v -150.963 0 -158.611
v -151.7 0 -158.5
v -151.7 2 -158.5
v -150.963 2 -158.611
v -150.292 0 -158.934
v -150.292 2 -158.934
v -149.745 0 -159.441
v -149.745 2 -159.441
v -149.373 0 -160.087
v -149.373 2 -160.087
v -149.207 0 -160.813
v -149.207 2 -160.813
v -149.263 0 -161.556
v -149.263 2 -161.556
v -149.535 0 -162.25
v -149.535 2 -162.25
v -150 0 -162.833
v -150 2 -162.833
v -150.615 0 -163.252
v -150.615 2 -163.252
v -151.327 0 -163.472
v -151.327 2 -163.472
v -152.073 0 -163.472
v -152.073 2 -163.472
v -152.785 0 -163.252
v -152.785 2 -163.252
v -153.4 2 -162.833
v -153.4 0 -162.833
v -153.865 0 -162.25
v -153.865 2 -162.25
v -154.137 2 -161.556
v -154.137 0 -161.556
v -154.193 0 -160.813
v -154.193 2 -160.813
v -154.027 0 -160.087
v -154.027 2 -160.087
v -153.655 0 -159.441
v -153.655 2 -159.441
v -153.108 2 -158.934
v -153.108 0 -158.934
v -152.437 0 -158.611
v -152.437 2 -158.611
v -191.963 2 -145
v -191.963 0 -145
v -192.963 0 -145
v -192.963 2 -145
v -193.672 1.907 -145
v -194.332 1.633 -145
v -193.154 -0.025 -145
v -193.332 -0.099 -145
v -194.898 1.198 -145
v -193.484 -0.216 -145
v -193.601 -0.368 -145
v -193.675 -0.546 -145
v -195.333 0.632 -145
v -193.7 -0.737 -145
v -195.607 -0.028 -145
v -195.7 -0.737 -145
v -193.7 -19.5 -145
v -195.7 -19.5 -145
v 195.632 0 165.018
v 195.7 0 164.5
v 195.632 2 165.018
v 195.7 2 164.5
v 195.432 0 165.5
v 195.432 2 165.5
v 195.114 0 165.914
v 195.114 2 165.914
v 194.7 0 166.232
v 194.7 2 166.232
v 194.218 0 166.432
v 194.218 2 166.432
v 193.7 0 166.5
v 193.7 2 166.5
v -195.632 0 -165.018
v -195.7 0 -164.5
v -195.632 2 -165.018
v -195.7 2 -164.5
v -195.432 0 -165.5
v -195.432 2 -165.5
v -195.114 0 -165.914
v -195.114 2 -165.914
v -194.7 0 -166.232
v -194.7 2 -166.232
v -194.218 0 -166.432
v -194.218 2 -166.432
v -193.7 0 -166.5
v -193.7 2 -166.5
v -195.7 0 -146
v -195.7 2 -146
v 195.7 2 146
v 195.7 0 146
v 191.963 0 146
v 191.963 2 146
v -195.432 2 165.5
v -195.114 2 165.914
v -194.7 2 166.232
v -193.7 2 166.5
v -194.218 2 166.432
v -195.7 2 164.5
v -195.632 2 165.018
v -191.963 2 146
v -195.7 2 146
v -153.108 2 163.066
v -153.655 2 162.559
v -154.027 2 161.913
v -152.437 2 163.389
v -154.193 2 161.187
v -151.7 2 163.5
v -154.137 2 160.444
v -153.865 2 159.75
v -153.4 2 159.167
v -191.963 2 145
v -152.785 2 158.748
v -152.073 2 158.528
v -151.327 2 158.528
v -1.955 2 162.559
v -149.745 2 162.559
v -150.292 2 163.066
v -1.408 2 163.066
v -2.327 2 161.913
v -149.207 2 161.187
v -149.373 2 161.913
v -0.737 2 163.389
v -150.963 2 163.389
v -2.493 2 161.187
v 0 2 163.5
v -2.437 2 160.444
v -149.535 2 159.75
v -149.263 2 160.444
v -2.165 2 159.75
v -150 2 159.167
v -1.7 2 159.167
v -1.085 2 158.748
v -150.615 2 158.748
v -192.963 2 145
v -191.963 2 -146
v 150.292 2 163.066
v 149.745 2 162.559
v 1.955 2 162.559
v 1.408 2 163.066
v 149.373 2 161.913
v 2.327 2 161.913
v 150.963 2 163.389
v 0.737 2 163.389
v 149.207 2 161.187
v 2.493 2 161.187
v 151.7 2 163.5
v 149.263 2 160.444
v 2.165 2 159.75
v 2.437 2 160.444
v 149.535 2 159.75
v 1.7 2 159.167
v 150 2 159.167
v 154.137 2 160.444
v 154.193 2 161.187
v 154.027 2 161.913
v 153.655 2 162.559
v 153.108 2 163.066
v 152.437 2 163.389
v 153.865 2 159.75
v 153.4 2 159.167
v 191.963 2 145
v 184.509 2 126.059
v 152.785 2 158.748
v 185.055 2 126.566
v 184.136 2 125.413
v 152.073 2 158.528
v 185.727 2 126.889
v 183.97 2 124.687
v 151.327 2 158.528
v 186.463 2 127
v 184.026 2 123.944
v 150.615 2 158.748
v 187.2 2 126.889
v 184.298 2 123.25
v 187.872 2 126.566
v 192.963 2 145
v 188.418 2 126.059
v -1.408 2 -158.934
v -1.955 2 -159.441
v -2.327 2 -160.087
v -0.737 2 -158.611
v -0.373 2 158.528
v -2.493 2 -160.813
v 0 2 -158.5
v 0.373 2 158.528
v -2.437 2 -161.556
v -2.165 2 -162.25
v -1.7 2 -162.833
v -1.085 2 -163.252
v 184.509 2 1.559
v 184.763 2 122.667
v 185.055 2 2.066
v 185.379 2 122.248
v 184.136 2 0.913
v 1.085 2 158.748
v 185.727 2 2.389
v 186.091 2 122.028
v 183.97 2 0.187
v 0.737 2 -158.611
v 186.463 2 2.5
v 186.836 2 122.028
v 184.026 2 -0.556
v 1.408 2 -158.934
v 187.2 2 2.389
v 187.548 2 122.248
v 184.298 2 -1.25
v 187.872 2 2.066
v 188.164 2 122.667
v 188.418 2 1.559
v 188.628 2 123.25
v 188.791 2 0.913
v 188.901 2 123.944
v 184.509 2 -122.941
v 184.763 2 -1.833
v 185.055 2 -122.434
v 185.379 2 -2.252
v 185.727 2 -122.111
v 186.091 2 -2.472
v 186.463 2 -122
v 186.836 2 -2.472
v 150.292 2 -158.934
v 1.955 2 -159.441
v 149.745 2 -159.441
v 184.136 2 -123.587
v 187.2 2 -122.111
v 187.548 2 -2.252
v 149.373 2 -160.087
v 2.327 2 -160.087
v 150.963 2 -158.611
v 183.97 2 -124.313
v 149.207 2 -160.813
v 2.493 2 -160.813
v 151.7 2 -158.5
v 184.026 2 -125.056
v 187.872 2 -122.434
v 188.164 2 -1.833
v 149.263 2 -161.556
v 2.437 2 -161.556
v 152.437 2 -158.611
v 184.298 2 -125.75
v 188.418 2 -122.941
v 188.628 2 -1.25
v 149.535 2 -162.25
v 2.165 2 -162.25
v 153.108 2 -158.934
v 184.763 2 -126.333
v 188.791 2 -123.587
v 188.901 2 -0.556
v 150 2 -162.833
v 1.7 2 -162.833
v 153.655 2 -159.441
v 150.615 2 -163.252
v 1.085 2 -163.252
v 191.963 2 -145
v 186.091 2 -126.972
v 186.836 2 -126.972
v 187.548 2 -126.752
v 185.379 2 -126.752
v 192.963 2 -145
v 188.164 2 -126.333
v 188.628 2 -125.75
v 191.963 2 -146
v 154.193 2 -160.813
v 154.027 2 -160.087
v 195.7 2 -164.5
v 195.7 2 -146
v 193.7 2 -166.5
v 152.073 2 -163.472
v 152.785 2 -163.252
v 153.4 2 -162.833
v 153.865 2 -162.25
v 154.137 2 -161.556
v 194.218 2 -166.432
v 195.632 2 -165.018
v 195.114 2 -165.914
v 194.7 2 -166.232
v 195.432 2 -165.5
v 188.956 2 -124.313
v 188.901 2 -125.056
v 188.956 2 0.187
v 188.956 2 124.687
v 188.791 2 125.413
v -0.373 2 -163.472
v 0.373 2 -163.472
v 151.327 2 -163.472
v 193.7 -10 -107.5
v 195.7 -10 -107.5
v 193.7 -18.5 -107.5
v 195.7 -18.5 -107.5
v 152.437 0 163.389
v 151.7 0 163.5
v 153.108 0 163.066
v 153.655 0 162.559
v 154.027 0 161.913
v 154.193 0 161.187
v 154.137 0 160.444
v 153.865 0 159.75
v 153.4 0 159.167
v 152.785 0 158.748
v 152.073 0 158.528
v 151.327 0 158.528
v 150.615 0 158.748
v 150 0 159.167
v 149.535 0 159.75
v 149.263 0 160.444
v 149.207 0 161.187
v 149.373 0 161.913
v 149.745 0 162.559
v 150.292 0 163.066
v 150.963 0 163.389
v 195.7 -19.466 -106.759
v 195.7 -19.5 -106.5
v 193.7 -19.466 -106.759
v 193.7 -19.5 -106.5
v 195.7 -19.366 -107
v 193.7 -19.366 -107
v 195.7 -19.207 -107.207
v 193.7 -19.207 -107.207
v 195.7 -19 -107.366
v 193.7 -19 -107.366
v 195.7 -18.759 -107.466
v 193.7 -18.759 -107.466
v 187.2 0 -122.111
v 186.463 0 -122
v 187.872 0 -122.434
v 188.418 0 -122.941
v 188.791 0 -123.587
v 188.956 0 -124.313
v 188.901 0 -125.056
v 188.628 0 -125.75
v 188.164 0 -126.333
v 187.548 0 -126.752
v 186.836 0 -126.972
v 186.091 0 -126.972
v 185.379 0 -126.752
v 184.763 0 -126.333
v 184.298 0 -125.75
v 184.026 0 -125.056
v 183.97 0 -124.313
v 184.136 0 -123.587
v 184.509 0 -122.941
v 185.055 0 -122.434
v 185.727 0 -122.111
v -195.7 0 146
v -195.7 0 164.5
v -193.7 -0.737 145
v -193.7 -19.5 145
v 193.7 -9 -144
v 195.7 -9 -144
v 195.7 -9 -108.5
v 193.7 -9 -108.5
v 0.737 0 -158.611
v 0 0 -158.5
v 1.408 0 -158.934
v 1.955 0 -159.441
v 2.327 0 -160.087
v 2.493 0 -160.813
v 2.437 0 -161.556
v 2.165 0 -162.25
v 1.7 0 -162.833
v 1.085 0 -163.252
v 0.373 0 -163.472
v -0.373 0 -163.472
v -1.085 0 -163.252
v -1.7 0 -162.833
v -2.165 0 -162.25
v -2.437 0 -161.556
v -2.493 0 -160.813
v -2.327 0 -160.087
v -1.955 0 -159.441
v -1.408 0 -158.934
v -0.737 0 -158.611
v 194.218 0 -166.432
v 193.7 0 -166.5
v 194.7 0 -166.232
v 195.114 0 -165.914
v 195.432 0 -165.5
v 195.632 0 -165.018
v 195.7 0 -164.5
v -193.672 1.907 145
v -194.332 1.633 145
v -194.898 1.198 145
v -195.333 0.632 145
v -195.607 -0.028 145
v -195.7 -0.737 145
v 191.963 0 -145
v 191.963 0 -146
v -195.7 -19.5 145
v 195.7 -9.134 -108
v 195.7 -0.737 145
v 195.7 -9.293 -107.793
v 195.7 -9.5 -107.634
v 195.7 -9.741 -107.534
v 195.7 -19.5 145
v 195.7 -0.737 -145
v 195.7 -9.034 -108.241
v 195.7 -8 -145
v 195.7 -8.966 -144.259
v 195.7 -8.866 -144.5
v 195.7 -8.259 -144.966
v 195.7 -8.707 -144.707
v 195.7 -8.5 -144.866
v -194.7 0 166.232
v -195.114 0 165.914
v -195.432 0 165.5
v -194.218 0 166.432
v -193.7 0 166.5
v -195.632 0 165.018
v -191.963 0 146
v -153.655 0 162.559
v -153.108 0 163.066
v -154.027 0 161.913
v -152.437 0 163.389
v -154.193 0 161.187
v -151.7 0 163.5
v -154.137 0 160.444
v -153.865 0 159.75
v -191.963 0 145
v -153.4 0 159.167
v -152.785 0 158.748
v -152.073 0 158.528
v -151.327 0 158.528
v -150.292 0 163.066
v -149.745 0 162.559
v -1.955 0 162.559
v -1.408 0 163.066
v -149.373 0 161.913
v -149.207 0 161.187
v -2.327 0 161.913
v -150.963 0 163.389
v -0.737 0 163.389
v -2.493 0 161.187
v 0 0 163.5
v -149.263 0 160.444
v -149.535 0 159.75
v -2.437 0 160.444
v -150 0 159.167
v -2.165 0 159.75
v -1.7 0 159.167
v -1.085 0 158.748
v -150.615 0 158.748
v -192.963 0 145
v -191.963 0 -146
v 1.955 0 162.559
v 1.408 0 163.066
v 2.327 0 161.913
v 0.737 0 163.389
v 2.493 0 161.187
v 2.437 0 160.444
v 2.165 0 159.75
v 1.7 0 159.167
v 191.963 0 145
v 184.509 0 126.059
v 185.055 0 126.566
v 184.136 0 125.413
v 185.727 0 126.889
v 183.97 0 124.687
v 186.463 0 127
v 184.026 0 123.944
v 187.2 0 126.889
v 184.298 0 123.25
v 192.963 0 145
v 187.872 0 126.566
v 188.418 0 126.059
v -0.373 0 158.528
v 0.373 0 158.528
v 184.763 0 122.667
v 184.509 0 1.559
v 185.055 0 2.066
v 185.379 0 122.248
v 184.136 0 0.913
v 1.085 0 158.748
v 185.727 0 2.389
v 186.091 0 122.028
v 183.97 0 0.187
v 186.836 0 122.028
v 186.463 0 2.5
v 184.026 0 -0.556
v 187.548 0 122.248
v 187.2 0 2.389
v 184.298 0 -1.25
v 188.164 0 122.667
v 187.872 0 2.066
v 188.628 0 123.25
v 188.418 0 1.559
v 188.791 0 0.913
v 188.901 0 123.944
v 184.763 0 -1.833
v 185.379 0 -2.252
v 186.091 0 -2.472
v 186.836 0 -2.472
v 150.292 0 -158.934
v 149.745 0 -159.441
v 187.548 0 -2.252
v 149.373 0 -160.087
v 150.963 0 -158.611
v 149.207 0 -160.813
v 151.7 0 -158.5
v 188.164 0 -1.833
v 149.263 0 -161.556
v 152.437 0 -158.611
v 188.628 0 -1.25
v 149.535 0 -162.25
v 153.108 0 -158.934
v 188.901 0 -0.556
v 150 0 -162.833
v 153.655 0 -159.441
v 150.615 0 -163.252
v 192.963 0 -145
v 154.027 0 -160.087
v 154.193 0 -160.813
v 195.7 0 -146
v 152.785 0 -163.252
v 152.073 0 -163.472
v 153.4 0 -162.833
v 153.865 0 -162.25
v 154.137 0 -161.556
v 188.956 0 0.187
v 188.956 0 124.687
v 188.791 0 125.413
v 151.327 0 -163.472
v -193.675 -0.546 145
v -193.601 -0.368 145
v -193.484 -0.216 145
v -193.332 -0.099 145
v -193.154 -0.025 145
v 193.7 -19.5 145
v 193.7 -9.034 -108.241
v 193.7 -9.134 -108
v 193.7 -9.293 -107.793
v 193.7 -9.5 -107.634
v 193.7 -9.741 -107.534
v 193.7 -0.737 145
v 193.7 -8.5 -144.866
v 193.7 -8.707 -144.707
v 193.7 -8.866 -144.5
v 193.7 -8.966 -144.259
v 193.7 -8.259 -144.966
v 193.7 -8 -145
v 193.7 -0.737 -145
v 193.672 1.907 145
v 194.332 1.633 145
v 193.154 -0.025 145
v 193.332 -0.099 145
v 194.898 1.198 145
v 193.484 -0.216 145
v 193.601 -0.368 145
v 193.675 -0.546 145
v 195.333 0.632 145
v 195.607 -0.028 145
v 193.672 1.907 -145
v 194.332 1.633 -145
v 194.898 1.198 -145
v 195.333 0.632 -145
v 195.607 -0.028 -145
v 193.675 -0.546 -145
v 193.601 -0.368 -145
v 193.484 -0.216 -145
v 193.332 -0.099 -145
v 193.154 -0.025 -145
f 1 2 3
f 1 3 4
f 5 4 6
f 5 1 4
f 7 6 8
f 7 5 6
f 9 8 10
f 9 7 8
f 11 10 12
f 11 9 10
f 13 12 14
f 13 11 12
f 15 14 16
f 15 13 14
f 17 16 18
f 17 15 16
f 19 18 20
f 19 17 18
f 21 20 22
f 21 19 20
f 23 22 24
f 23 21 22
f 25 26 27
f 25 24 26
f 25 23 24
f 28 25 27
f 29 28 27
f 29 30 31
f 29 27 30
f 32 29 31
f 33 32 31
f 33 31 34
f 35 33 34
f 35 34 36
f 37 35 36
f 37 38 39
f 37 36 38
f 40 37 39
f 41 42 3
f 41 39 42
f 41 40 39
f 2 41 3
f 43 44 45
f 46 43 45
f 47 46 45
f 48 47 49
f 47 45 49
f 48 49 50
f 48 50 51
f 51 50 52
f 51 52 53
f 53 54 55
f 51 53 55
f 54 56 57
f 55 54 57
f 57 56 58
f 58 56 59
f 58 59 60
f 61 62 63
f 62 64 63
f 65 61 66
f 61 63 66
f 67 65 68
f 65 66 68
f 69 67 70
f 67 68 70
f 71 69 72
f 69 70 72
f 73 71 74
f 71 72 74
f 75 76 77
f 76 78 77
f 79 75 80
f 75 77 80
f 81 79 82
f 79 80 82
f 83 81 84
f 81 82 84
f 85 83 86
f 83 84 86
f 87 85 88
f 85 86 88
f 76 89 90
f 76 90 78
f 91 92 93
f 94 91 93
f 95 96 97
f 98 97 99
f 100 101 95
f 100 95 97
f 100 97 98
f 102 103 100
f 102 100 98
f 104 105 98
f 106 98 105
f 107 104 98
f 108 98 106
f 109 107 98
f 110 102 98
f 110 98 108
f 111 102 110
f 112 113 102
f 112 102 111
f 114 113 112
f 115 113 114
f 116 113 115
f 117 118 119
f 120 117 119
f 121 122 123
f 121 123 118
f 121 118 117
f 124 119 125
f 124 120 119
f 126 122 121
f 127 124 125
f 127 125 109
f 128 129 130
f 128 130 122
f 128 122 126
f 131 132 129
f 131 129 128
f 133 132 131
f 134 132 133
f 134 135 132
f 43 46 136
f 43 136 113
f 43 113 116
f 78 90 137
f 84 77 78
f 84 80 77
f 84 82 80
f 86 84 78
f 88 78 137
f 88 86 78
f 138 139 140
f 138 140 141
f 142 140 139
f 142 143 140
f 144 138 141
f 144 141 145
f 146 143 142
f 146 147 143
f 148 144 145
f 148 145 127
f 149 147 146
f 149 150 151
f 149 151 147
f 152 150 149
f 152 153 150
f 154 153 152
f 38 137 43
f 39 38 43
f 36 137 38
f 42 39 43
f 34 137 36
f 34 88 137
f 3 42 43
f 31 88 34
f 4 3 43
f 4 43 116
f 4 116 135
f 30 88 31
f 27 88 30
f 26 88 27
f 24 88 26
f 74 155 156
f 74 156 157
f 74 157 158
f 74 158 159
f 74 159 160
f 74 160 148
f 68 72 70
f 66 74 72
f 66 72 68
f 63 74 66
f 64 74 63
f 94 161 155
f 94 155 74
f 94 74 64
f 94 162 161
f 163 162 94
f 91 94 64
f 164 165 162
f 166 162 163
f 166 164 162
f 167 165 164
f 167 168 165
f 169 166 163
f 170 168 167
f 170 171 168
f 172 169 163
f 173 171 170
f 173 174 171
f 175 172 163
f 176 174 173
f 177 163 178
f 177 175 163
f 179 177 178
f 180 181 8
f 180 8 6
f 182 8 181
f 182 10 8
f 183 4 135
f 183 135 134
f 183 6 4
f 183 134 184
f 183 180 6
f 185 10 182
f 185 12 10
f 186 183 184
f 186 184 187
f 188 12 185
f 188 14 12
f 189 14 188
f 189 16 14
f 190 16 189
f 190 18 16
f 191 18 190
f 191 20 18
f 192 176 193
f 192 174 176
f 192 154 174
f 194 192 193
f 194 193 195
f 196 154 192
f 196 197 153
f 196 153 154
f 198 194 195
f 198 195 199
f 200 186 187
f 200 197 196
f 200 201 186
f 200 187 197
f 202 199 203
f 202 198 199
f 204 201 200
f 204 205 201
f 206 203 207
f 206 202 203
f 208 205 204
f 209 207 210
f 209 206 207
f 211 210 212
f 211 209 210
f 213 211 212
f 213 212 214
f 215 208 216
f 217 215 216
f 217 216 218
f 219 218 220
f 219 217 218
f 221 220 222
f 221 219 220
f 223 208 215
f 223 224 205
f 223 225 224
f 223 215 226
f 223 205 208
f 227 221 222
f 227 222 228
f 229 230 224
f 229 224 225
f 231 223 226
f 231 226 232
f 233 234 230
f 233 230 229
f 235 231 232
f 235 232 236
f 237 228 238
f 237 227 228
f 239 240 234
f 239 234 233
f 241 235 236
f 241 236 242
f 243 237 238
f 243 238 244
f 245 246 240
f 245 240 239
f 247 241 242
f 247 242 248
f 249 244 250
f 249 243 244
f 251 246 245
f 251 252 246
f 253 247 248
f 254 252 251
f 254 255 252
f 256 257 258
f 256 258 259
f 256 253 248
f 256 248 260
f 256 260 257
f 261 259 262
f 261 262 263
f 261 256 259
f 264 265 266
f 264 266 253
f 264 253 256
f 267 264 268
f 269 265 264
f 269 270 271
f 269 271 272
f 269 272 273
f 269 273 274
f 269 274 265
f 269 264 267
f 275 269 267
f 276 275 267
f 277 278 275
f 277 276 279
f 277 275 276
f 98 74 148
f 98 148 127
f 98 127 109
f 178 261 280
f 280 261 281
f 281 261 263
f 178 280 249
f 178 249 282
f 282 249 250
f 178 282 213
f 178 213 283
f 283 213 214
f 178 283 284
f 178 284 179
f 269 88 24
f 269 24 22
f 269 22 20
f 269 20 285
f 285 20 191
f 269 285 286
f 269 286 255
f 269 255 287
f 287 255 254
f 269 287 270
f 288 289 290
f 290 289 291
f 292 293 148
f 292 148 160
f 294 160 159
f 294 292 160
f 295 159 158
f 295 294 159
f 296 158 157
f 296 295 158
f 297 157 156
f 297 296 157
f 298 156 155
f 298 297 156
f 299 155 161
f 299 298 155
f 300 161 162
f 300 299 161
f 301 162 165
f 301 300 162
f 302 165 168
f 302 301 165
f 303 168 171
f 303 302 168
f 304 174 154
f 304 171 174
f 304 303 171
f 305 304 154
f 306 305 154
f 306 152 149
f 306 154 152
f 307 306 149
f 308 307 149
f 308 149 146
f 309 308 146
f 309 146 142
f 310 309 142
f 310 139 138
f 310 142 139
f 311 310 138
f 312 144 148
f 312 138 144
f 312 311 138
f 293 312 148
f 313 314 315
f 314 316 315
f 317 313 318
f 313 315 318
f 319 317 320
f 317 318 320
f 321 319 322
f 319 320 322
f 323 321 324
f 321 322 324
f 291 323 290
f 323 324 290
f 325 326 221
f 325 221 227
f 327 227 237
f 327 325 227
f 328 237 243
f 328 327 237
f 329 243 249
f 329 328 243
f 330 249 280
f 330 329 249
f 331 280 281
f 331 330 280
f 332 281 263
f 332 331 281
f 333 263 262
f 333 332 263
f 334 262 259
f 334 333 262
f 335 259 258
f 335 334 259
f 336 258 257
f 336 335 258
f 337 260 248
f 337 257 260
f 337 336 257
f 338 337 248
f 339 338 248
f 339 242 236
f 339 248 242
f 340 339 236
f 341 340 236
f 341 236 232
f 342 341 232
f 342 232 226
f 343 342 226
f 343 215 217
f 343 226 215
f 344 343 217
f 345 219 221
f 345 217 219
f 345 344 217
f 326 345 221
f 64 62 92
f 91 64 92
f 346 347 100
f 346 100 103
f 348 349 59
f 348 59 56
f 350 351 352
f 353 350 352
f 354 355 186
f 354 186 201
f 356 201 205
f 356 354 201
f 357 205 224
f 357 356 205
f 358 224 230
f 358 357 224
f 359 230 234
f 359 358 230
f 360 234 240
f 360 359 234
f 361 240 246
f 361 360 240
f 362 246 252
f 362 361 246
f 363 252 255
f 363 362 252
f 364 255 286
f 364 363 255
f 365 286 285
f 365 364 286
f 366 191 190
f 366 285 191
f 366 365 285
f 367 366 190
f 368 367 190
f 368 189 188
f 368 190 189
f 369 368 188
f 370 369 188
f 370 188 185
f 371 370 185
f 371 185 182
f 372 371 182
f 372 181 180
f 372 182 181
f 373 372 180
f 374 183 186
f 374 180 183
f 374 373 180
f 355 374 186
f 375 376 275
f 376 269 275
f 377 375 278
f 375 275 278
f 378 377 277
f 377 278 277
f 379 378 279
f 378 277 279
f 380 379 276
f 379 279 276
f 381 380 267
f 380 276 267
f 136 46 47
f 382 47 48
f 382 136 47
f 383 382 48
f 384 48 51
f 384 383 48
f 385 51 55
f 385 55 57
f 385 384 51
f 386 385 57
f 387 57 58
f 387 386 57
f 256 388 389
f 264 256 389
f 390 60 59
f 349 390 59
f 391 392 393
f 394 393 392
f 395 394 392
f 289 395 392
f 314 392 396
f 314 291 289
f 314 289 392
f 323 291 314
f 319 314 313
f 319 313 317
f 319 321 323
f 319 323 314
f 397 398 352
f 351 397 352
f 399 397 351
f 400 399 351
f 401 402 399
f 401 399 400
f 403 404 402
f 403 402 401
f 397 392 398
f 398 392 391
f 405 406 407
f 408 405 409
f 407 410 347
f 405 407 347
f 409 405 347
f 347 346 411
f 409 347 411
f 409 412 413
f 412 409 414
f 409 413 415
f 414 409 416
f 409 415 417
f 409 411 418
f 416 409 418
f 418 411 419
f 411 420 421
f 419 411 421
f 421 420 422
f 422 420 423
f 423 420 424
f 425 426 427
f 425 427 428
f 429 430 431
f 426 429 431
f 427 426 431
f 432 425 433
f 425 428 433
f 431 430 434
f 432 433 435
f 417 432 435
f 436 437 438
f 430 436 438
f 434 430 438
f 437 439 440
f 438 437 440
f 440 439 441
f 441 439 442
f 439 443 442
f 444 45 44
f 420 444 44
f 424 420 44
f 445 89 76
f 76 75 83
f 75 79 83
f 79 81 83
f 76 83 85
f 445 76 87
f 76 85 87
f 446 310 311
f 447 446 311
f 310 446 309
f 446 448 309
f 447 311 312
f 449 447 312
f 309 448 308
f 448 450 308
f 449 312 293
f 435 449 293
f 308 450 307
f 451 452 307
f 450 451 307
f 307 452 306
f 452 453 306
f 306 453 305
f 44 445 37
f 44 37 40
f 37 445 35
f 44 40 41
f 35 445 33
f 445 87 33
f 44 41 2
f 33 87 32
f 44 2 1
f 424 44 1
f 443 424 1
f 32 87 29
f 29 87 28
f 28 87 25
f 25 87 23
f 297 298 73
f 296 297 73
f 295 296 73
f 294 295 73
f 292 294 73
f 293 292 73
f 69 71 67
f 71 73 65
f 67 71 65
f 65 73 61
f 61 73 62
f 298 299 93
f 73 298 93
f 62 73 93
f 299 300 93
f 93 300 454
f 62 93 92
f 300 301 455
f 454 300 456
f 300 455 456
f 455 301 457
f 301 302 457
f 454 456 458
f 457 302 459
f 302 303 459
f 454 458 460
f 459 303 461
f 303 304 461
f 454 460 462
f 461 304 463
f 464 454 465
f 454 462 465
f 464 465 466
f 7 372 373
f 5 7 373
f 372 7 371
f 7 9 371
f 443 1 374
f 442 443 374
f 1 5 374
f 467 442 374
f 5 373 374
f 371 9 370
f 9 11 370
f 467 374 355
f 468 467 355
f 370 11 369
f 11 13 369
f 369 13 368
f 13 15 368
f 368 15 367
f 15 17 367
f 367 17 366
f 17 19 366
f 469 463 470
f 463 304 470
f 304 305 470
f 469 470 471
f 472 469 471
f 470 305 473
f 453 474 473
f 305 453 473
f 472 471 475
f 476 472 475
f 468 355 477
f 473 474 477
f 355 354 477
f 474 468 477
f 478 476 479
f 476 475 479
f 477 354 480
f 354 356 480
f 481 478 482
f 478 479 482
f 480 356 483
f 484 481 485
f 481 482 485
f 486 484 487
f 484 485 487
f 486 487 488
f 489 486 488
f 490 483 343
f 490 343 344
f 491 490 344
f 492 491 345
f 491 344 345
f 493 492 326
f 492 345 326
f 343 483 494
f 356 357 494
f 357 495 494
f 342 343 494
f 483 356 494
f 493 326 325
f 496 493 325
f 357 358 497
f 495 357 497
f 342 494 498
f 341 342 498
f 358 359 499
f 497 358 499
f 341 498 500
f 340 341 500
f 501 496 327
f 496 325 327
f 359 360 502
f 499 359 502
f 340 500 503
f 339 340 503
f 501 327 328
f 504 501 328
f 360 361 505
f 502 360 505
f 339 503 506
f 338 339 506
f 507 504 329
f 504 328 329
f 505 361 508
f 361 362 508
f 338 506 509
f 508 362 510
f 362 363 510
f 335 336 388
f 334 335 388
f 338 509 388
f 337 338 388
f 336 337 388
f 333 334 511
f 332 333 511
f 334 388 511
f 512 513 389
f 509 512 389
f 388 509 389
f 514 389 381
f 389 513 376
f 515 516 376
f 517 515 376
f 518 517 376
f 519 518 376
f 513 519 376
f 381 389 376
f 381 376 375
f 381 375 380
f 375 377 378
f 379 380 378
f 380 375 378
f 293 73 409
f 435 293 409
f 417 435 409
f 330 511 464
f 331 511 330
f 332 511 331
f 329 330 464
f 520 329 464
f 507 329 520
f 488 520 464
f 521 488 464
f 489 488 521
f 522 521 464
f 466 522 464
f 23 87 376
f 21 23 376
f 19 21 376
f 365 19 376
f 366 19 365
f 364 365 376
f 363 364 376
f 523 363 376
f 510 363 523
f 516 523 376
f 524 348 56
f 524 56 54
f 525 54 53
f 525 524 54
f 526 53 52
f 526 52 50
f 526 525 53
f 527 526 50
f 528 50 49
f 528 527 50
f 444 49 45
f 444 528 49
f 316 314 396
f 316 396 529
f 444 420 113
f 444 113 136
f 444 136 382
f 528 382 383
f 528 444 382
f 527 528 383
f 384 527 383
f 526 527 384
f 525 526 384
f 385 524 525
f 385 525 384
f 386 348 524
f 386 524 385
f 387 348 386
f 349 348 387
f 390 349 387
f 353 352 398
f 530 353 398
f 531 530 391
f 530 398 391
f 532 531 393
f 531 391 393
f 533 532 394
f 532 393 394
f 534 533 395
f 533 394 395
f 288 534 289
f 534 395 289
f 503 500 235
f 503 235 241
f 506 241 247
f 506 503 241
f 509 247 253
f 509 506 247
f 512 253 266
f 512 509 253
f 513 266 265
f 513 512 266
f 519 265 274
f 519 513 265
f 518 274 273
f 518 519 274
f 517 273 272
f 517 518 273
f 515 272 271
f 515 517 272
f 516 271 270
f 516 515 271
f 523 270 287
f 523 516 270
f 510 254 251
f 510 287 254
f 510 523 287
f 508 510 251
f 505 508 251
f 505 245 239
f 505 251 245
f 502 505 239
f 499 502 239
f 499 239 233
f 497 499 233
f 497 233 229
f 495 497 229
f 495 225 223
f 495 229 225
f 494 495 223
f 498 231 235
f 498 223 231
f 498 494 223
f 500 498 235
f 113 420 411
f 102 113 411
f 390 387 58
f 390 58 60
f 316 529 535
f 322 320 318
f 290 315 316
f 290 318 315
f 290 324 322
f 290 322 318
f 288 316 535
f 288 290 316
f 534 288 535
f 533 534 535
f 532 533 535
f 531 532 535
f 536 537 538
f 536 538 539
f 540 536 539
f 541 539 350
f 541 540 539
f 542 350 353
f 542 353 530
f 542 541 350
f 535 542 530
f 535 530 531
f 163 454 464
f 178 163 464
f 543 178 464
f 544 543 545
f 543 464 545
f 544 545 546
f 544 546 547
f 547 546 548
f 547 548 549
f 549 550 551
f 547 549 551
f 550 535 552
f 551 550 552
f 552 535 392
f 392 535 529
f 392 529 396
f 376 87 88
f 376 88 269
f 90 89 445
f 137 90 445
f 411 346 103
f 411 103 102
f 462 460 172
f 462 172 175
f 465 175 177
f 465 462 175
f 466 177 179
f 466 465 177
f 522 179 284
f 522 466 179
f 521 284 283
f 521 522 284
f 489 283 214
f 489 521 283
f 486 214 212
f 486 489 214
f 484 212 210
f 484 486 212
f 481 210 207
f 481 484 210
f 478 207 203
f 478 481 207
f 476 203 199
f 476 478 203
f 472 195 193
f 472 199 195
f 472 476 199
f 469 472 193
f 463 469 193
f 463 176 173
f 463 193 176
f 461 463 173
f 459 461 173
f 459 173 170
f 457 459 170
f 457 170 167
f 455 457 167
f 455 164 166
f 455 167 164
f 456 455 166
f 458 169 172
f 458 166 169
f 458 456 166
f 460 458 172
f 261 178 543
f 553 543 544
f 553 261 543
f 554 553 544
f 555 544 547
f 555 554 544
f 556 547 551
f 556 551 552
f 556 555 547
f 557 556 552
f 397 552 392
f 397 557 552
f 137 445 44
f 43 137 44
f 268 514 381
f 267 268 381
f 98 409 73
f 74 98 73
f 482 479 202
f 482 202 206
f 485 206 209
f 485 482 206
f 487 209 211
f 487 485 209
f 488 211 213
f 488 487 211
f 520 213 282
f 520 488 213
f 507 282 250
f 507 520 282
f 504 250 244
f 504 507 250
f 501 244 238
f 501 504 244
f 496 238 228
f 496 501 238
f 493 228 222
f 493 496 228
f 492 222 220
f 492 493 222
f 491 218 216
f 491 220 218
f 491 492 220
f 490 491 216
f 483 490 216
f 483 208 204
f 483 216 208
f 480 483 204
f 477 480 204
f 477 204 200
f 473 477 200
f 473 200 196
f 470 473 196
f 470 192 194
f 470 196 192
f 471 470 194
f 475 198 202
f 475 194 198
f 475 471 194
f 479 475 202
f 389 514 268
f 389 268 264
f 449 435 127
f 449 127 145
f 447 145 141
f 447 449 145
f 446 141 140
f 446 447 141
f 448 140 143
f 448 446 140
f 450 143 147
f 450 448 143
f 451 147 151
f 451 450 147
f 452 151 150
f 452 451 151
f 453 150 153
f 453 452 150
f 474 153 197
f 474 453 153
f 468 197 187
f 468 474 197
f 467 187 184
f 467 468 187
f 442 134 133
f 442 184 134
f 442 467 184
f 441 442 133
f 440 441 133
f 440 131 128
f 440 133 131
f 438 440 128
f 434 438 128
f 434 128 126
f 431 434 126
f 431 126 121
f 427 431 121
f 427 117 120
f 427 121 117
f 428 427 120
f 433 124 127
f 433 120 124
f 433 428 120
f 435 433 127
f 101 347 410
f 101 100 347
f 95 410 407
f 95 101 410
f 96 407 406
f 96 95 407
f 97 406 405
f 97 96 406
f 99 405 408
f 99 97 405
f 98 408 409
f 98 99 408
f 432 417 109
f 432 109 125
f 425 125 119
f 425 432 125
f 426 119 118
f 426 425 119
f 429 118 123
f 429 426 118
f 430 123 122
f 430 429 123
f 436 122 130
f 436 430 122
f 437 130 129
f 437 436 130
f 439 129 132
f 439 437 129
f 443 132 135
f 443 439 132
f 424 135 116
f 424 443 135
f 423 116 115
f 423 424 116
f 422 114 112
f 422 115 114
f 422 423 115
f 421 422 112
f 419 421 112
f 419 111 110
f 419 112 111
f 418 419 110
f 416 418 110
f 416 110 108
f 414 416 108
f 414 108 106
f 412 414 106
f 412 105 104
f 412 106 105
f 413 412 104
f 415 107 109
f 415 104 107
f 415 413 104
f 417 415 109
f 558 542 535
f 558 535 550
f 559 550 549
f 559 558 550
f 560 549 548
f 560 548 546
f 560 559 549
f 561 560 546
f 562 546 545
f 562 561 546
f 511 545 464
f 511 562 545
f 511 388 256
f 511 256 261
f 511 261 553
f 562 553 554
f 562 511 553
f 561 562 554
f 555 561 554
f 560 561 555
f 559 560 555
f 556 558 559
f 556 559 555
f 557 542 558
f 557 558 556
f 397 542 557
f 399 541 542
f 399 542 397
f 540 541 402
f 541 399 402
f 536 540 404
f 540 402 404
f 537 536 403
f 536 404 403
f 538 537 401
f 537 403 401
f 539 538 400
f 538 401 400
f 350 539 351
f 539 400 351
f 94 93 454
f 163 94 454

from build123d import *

# Parameters (mm, degrees)
SKETCH1_W                       = 391.4
SKETCH1_H                       = 333
BASE_FLANGE1_DEPTH              = 2
EDGE_FLANGE1_STRIP_W            = 9.4732
EDGE_FLANGE1_STRIP_H            = 2
EDGE_FLANGE1_STRIP_CUT_DEPTH    = 290
EDGE_FLANGE1_RELIEF_W           = 10.4732
EDGE_FLANGE1_RELIEF_H           = 1
EDGE_FLANGE1_RELIEF_CUT_DEPTH   = 2
EDGE_FLANGE1_STRIP_2_W          = 9.4732
EDGE_FLANGE1_STRIP_2_H          = 2
EDGE_FLANGE1_STRIP_CUT_2_DEPTH  = 290
EDGE_FLANGE1_RELIEF_2_W         = 10.4732
EDGE_FLANGE1_RELIEF_2_H         = 1
EDGE_FLANGE1_RELIEF_CUT_2_DEPTH = 2
EDGE_FLANGE1_DEPTH              = 290
EDGE_FLANGE1_BEND_DEPTH         = 290
FILLET1_R                       = 2
CUT_EXTRUDE1_DEPTH              = 10
FILLET2_R                       = 1
CUT_EXTRUDE2_DEPTH              = 258.84295608
CUT_EXTRUDE2_DEPTH_BACK         = 258.84295608
SKETCH9_R                       = 2.5


# Sheet-metal steps are written as plain solids
with BuildPart() as part:
    # Sketch1 → Base-Flange1 (new body)
    with BuildSketch(Plane(origin=(0, 0, 0), x_dir=(1, 0, 0), z_dir=(0, 1, 0))):
        Rectangle(SKETCH1_W, SKETCH1_H)
    extrude(amount=BASE_FLANGE1_DEPTH)

    # Edge-Flange1 strip (across the edge) → Edge-Flange1 strip cut (cut)
    with BuildSketch(Plane(origin=(-195.7, 0, 145), x_dir=(1, 0, 0), z_dir=(0, 0, -1))):
        with Locations((-2, -1)):
            Rectangle(EDGE_FLANGE1_STRIP_W, EDGE_FLANGE1_STRIP_H)
    extrude(amount=EDGE_FLANGE1_STRIP_CUT_DEPTH, mode=Mode.SUBTRACT)

    # Edge-Flange1 relief (on the sheet) → Edge-Flange1 relief cut (cut)
    with BuildSketch(Plane(origin=(-192.9634, 0, 145), x_dir=(1, 0, 0), z_dir=(0, -1, 0))):
        with Locations((-4.2366, 0.5)):
            Rectangle(EDGE_FLANGE1_RELIEF_W, EDGE_FLANGE1_RELIEF_H)
        with Locations((-4.2366, -290.5)):
            Rectangle(EDGE_FLANGE1_RELIEF_W, EDGE_FLANGE1_RELIEF_H)
    extrude(amount=-EDGE_FLANGE1_RELIEF_CUT_DEPTH, mode=Mode.SUBTRACT)

    # Edge-Flange1 strip 2 (across the edge) → Edge-Flange1 strip cut 2 (cut)
    with BuildSketch(Plane(origin=(195.7, 0, -145), x_dir=(-1, 0, 0), z_dir=(0, 0, 1))):
        with Locations((-2, -1)):
            Rectangle(EDGE_FLANGE1_STRIP_2_W, EDGE_FLANGE1_STRIP_2_H)
    extrude(amount=EDGE_FLANGE1_STRIP_CUT_2_DEPTH, mode=Mode.SUBTRACT)

    # Edge-Flange1 relief 2 (on the sheet) → Edge-Flange1 relief cut 2 (cut)
    with BuildSketch(Plane(origin=(192.9634, 0, -145), x_dir=(-1, 0, 0), z_dir=(0, -1, 0))):
        with Locations((-4.2366, 0.5)):
            Rectangle(EDGE_FLANGE1_RELIEF_2_W, EDGE_FLANGE1_RELIEF_2_H)
        with Locations((-4.2366, -290.5)):
            Rectangle(EDGE_FLANGE1_RELIEF_2_W, EDGE_FLANGE1_RELIEF_2_H)
    extrude(amount=-EDGE_FLANGE1_RELIEF_CUT_2_DEPTH, mode=Mode.SUBTRACT)

    # Edge-Flange1 section (across the edge) → Edge-Flange1 (add)
    with BuildSketch(Plane(origin=(-195.7, 0, 145), x_dir=(1, 0, 0), z_dir=(0, 0, -1))):
        with BuildLine():
            Line((0, 0.7366), (0, 19.5))
            Line((0, 19.5), (2, 19.5))
            Line((2, 19.5), (2, 0.7366))
            ThreePointArc((2, 0.7366), (2.215745145, 0.215745145), (2.7366, 0))
            Line((2.7366, 0), (2.7366, -2))
            ThreePointArc((2.7366, -2), (0.801531583, -1.198468417), (0, 0.7366))
        make_face()
    extrude(amount=EDGE_FLANGE1_DEPTH)

    # Edge-Flange1 section 2 (across the edge) → Edge-Flange1 bend (add)
    with BuildSketch(Plane(origin=(195.7, 0, -145), x_dir=(-1, 0, 0), z_dir=(0, 0, 1))):
        with BuildLine():
            Line((0, 0.7366), (0, 19.5))
            Line((0, 19.5), (2, 19.5))
            Line((2, 19.5), (2, 0.7366))
            ThreePointArc((2, 0.7366), (2.215745145, 0.215745145), (2.7366, 0))
            Line((2.7366, 0), (2.7366, -2))
            ThreePointArc((2.7366, -2), (0.801531583, -1.198468417), (0, 0.7366))
        make_face()
    extrude(amount=EDGE_FLANGE1_BEND_DEPTH)

    # Fillet1
    fillet1_edges = [part.edges().sort_by_distance(p)[0] for p in [
        (195.7, 1, 166.5),
        (-195.7, 1, 166.5),
        (-195.7, 1, -166.5),
        (195.7, 1, -166.5),
    ]]
    fillet(fillet1_edges, radius=FILLET1_R)

    # Sketch8 → Cut-Extrude1 (cut)
    with BuildSketch(Plane(origin=(195.7, 0, 0), x_dir=(0, 0, -1), z_dir=(1, 0, 0))):
        with BuildLine():
            Line((107.5, -19.5), (147.855530229, -19.5))
            Line((147.855530229, -19.5), (147.855530229, -9))
            Line((147.855530229, -9), (108.5, -9))
            ThreePointArc((108.5, -9), (107.792893219, -9.292893219), (107.5, -10))
            Line((107.5, -10), (107.5, -19.5))
        make_face()
    extrude(amount=-CUT_EXTRUDE1_DEPTH, mode=Mode.SUBTRACT)

    # Fillet2
    fillet2_edges = [part.edges().sort_by_distance(p)[0] for p in [
        (194.7, -19.5, -107.5),
        (194.7, -9, -145),
    ]]
    fillet(fillet2_edges, radius=FILLET2_R)

    # Sketch9 → Cut-Extrude2 (cut, two sides: drawn at the far end of the back side and taken through both)
    with BuildSketch(Plane(origin=(0, 2, 0), x_dir=(1, 0, 0), z_dir=(0, 1, 0)).offset(-CUT_EXTRUDE2_DEPTH_BACK)):
        with Locations(Location((-151.7, -161, 0), (0, 0, 270))):
            Circle(SKETCH9_R)
        with Locations(Location((0, -161, 0), (0, 0, 270))):
            Circle(SKETCH9_R)
        with Locations(Location((151.7, -161, 0), (0, 0, 270))):
            Circle(SKETCH9_R)
        with Locations(Location((186.4634, -124.5, 0), (0, 0, 270))):
            Circle(SKETCH9_R)
        with Locations(Location((186.4634, 0, 0), (0, 0, 270))):
            Circle(SKETCH9_R)
        with Locations(Location((186.4634, 124.5, 0), (0, 0, 270))):
            Circle(SKETCH9_R)
        with Locations(Location((151.7, 161, 0), (0, 0, 270))):
            Circle(SKETCH9_R)
        with Locations(Location((0, 161, 0), (0, 0, 270))):
            Circle(SKETCH9_R)
        with Locations(Location((-151.7, 161, 0), (0, 0, 270))):
            Circle(SKETCH9_R)
    extrude(amount=CUT_EXTRUDE2_DEPTH + CUT_EXTRUDE2_DEPTH_BACK, mode=Mode.SUBTRACT)


solid = part.part
